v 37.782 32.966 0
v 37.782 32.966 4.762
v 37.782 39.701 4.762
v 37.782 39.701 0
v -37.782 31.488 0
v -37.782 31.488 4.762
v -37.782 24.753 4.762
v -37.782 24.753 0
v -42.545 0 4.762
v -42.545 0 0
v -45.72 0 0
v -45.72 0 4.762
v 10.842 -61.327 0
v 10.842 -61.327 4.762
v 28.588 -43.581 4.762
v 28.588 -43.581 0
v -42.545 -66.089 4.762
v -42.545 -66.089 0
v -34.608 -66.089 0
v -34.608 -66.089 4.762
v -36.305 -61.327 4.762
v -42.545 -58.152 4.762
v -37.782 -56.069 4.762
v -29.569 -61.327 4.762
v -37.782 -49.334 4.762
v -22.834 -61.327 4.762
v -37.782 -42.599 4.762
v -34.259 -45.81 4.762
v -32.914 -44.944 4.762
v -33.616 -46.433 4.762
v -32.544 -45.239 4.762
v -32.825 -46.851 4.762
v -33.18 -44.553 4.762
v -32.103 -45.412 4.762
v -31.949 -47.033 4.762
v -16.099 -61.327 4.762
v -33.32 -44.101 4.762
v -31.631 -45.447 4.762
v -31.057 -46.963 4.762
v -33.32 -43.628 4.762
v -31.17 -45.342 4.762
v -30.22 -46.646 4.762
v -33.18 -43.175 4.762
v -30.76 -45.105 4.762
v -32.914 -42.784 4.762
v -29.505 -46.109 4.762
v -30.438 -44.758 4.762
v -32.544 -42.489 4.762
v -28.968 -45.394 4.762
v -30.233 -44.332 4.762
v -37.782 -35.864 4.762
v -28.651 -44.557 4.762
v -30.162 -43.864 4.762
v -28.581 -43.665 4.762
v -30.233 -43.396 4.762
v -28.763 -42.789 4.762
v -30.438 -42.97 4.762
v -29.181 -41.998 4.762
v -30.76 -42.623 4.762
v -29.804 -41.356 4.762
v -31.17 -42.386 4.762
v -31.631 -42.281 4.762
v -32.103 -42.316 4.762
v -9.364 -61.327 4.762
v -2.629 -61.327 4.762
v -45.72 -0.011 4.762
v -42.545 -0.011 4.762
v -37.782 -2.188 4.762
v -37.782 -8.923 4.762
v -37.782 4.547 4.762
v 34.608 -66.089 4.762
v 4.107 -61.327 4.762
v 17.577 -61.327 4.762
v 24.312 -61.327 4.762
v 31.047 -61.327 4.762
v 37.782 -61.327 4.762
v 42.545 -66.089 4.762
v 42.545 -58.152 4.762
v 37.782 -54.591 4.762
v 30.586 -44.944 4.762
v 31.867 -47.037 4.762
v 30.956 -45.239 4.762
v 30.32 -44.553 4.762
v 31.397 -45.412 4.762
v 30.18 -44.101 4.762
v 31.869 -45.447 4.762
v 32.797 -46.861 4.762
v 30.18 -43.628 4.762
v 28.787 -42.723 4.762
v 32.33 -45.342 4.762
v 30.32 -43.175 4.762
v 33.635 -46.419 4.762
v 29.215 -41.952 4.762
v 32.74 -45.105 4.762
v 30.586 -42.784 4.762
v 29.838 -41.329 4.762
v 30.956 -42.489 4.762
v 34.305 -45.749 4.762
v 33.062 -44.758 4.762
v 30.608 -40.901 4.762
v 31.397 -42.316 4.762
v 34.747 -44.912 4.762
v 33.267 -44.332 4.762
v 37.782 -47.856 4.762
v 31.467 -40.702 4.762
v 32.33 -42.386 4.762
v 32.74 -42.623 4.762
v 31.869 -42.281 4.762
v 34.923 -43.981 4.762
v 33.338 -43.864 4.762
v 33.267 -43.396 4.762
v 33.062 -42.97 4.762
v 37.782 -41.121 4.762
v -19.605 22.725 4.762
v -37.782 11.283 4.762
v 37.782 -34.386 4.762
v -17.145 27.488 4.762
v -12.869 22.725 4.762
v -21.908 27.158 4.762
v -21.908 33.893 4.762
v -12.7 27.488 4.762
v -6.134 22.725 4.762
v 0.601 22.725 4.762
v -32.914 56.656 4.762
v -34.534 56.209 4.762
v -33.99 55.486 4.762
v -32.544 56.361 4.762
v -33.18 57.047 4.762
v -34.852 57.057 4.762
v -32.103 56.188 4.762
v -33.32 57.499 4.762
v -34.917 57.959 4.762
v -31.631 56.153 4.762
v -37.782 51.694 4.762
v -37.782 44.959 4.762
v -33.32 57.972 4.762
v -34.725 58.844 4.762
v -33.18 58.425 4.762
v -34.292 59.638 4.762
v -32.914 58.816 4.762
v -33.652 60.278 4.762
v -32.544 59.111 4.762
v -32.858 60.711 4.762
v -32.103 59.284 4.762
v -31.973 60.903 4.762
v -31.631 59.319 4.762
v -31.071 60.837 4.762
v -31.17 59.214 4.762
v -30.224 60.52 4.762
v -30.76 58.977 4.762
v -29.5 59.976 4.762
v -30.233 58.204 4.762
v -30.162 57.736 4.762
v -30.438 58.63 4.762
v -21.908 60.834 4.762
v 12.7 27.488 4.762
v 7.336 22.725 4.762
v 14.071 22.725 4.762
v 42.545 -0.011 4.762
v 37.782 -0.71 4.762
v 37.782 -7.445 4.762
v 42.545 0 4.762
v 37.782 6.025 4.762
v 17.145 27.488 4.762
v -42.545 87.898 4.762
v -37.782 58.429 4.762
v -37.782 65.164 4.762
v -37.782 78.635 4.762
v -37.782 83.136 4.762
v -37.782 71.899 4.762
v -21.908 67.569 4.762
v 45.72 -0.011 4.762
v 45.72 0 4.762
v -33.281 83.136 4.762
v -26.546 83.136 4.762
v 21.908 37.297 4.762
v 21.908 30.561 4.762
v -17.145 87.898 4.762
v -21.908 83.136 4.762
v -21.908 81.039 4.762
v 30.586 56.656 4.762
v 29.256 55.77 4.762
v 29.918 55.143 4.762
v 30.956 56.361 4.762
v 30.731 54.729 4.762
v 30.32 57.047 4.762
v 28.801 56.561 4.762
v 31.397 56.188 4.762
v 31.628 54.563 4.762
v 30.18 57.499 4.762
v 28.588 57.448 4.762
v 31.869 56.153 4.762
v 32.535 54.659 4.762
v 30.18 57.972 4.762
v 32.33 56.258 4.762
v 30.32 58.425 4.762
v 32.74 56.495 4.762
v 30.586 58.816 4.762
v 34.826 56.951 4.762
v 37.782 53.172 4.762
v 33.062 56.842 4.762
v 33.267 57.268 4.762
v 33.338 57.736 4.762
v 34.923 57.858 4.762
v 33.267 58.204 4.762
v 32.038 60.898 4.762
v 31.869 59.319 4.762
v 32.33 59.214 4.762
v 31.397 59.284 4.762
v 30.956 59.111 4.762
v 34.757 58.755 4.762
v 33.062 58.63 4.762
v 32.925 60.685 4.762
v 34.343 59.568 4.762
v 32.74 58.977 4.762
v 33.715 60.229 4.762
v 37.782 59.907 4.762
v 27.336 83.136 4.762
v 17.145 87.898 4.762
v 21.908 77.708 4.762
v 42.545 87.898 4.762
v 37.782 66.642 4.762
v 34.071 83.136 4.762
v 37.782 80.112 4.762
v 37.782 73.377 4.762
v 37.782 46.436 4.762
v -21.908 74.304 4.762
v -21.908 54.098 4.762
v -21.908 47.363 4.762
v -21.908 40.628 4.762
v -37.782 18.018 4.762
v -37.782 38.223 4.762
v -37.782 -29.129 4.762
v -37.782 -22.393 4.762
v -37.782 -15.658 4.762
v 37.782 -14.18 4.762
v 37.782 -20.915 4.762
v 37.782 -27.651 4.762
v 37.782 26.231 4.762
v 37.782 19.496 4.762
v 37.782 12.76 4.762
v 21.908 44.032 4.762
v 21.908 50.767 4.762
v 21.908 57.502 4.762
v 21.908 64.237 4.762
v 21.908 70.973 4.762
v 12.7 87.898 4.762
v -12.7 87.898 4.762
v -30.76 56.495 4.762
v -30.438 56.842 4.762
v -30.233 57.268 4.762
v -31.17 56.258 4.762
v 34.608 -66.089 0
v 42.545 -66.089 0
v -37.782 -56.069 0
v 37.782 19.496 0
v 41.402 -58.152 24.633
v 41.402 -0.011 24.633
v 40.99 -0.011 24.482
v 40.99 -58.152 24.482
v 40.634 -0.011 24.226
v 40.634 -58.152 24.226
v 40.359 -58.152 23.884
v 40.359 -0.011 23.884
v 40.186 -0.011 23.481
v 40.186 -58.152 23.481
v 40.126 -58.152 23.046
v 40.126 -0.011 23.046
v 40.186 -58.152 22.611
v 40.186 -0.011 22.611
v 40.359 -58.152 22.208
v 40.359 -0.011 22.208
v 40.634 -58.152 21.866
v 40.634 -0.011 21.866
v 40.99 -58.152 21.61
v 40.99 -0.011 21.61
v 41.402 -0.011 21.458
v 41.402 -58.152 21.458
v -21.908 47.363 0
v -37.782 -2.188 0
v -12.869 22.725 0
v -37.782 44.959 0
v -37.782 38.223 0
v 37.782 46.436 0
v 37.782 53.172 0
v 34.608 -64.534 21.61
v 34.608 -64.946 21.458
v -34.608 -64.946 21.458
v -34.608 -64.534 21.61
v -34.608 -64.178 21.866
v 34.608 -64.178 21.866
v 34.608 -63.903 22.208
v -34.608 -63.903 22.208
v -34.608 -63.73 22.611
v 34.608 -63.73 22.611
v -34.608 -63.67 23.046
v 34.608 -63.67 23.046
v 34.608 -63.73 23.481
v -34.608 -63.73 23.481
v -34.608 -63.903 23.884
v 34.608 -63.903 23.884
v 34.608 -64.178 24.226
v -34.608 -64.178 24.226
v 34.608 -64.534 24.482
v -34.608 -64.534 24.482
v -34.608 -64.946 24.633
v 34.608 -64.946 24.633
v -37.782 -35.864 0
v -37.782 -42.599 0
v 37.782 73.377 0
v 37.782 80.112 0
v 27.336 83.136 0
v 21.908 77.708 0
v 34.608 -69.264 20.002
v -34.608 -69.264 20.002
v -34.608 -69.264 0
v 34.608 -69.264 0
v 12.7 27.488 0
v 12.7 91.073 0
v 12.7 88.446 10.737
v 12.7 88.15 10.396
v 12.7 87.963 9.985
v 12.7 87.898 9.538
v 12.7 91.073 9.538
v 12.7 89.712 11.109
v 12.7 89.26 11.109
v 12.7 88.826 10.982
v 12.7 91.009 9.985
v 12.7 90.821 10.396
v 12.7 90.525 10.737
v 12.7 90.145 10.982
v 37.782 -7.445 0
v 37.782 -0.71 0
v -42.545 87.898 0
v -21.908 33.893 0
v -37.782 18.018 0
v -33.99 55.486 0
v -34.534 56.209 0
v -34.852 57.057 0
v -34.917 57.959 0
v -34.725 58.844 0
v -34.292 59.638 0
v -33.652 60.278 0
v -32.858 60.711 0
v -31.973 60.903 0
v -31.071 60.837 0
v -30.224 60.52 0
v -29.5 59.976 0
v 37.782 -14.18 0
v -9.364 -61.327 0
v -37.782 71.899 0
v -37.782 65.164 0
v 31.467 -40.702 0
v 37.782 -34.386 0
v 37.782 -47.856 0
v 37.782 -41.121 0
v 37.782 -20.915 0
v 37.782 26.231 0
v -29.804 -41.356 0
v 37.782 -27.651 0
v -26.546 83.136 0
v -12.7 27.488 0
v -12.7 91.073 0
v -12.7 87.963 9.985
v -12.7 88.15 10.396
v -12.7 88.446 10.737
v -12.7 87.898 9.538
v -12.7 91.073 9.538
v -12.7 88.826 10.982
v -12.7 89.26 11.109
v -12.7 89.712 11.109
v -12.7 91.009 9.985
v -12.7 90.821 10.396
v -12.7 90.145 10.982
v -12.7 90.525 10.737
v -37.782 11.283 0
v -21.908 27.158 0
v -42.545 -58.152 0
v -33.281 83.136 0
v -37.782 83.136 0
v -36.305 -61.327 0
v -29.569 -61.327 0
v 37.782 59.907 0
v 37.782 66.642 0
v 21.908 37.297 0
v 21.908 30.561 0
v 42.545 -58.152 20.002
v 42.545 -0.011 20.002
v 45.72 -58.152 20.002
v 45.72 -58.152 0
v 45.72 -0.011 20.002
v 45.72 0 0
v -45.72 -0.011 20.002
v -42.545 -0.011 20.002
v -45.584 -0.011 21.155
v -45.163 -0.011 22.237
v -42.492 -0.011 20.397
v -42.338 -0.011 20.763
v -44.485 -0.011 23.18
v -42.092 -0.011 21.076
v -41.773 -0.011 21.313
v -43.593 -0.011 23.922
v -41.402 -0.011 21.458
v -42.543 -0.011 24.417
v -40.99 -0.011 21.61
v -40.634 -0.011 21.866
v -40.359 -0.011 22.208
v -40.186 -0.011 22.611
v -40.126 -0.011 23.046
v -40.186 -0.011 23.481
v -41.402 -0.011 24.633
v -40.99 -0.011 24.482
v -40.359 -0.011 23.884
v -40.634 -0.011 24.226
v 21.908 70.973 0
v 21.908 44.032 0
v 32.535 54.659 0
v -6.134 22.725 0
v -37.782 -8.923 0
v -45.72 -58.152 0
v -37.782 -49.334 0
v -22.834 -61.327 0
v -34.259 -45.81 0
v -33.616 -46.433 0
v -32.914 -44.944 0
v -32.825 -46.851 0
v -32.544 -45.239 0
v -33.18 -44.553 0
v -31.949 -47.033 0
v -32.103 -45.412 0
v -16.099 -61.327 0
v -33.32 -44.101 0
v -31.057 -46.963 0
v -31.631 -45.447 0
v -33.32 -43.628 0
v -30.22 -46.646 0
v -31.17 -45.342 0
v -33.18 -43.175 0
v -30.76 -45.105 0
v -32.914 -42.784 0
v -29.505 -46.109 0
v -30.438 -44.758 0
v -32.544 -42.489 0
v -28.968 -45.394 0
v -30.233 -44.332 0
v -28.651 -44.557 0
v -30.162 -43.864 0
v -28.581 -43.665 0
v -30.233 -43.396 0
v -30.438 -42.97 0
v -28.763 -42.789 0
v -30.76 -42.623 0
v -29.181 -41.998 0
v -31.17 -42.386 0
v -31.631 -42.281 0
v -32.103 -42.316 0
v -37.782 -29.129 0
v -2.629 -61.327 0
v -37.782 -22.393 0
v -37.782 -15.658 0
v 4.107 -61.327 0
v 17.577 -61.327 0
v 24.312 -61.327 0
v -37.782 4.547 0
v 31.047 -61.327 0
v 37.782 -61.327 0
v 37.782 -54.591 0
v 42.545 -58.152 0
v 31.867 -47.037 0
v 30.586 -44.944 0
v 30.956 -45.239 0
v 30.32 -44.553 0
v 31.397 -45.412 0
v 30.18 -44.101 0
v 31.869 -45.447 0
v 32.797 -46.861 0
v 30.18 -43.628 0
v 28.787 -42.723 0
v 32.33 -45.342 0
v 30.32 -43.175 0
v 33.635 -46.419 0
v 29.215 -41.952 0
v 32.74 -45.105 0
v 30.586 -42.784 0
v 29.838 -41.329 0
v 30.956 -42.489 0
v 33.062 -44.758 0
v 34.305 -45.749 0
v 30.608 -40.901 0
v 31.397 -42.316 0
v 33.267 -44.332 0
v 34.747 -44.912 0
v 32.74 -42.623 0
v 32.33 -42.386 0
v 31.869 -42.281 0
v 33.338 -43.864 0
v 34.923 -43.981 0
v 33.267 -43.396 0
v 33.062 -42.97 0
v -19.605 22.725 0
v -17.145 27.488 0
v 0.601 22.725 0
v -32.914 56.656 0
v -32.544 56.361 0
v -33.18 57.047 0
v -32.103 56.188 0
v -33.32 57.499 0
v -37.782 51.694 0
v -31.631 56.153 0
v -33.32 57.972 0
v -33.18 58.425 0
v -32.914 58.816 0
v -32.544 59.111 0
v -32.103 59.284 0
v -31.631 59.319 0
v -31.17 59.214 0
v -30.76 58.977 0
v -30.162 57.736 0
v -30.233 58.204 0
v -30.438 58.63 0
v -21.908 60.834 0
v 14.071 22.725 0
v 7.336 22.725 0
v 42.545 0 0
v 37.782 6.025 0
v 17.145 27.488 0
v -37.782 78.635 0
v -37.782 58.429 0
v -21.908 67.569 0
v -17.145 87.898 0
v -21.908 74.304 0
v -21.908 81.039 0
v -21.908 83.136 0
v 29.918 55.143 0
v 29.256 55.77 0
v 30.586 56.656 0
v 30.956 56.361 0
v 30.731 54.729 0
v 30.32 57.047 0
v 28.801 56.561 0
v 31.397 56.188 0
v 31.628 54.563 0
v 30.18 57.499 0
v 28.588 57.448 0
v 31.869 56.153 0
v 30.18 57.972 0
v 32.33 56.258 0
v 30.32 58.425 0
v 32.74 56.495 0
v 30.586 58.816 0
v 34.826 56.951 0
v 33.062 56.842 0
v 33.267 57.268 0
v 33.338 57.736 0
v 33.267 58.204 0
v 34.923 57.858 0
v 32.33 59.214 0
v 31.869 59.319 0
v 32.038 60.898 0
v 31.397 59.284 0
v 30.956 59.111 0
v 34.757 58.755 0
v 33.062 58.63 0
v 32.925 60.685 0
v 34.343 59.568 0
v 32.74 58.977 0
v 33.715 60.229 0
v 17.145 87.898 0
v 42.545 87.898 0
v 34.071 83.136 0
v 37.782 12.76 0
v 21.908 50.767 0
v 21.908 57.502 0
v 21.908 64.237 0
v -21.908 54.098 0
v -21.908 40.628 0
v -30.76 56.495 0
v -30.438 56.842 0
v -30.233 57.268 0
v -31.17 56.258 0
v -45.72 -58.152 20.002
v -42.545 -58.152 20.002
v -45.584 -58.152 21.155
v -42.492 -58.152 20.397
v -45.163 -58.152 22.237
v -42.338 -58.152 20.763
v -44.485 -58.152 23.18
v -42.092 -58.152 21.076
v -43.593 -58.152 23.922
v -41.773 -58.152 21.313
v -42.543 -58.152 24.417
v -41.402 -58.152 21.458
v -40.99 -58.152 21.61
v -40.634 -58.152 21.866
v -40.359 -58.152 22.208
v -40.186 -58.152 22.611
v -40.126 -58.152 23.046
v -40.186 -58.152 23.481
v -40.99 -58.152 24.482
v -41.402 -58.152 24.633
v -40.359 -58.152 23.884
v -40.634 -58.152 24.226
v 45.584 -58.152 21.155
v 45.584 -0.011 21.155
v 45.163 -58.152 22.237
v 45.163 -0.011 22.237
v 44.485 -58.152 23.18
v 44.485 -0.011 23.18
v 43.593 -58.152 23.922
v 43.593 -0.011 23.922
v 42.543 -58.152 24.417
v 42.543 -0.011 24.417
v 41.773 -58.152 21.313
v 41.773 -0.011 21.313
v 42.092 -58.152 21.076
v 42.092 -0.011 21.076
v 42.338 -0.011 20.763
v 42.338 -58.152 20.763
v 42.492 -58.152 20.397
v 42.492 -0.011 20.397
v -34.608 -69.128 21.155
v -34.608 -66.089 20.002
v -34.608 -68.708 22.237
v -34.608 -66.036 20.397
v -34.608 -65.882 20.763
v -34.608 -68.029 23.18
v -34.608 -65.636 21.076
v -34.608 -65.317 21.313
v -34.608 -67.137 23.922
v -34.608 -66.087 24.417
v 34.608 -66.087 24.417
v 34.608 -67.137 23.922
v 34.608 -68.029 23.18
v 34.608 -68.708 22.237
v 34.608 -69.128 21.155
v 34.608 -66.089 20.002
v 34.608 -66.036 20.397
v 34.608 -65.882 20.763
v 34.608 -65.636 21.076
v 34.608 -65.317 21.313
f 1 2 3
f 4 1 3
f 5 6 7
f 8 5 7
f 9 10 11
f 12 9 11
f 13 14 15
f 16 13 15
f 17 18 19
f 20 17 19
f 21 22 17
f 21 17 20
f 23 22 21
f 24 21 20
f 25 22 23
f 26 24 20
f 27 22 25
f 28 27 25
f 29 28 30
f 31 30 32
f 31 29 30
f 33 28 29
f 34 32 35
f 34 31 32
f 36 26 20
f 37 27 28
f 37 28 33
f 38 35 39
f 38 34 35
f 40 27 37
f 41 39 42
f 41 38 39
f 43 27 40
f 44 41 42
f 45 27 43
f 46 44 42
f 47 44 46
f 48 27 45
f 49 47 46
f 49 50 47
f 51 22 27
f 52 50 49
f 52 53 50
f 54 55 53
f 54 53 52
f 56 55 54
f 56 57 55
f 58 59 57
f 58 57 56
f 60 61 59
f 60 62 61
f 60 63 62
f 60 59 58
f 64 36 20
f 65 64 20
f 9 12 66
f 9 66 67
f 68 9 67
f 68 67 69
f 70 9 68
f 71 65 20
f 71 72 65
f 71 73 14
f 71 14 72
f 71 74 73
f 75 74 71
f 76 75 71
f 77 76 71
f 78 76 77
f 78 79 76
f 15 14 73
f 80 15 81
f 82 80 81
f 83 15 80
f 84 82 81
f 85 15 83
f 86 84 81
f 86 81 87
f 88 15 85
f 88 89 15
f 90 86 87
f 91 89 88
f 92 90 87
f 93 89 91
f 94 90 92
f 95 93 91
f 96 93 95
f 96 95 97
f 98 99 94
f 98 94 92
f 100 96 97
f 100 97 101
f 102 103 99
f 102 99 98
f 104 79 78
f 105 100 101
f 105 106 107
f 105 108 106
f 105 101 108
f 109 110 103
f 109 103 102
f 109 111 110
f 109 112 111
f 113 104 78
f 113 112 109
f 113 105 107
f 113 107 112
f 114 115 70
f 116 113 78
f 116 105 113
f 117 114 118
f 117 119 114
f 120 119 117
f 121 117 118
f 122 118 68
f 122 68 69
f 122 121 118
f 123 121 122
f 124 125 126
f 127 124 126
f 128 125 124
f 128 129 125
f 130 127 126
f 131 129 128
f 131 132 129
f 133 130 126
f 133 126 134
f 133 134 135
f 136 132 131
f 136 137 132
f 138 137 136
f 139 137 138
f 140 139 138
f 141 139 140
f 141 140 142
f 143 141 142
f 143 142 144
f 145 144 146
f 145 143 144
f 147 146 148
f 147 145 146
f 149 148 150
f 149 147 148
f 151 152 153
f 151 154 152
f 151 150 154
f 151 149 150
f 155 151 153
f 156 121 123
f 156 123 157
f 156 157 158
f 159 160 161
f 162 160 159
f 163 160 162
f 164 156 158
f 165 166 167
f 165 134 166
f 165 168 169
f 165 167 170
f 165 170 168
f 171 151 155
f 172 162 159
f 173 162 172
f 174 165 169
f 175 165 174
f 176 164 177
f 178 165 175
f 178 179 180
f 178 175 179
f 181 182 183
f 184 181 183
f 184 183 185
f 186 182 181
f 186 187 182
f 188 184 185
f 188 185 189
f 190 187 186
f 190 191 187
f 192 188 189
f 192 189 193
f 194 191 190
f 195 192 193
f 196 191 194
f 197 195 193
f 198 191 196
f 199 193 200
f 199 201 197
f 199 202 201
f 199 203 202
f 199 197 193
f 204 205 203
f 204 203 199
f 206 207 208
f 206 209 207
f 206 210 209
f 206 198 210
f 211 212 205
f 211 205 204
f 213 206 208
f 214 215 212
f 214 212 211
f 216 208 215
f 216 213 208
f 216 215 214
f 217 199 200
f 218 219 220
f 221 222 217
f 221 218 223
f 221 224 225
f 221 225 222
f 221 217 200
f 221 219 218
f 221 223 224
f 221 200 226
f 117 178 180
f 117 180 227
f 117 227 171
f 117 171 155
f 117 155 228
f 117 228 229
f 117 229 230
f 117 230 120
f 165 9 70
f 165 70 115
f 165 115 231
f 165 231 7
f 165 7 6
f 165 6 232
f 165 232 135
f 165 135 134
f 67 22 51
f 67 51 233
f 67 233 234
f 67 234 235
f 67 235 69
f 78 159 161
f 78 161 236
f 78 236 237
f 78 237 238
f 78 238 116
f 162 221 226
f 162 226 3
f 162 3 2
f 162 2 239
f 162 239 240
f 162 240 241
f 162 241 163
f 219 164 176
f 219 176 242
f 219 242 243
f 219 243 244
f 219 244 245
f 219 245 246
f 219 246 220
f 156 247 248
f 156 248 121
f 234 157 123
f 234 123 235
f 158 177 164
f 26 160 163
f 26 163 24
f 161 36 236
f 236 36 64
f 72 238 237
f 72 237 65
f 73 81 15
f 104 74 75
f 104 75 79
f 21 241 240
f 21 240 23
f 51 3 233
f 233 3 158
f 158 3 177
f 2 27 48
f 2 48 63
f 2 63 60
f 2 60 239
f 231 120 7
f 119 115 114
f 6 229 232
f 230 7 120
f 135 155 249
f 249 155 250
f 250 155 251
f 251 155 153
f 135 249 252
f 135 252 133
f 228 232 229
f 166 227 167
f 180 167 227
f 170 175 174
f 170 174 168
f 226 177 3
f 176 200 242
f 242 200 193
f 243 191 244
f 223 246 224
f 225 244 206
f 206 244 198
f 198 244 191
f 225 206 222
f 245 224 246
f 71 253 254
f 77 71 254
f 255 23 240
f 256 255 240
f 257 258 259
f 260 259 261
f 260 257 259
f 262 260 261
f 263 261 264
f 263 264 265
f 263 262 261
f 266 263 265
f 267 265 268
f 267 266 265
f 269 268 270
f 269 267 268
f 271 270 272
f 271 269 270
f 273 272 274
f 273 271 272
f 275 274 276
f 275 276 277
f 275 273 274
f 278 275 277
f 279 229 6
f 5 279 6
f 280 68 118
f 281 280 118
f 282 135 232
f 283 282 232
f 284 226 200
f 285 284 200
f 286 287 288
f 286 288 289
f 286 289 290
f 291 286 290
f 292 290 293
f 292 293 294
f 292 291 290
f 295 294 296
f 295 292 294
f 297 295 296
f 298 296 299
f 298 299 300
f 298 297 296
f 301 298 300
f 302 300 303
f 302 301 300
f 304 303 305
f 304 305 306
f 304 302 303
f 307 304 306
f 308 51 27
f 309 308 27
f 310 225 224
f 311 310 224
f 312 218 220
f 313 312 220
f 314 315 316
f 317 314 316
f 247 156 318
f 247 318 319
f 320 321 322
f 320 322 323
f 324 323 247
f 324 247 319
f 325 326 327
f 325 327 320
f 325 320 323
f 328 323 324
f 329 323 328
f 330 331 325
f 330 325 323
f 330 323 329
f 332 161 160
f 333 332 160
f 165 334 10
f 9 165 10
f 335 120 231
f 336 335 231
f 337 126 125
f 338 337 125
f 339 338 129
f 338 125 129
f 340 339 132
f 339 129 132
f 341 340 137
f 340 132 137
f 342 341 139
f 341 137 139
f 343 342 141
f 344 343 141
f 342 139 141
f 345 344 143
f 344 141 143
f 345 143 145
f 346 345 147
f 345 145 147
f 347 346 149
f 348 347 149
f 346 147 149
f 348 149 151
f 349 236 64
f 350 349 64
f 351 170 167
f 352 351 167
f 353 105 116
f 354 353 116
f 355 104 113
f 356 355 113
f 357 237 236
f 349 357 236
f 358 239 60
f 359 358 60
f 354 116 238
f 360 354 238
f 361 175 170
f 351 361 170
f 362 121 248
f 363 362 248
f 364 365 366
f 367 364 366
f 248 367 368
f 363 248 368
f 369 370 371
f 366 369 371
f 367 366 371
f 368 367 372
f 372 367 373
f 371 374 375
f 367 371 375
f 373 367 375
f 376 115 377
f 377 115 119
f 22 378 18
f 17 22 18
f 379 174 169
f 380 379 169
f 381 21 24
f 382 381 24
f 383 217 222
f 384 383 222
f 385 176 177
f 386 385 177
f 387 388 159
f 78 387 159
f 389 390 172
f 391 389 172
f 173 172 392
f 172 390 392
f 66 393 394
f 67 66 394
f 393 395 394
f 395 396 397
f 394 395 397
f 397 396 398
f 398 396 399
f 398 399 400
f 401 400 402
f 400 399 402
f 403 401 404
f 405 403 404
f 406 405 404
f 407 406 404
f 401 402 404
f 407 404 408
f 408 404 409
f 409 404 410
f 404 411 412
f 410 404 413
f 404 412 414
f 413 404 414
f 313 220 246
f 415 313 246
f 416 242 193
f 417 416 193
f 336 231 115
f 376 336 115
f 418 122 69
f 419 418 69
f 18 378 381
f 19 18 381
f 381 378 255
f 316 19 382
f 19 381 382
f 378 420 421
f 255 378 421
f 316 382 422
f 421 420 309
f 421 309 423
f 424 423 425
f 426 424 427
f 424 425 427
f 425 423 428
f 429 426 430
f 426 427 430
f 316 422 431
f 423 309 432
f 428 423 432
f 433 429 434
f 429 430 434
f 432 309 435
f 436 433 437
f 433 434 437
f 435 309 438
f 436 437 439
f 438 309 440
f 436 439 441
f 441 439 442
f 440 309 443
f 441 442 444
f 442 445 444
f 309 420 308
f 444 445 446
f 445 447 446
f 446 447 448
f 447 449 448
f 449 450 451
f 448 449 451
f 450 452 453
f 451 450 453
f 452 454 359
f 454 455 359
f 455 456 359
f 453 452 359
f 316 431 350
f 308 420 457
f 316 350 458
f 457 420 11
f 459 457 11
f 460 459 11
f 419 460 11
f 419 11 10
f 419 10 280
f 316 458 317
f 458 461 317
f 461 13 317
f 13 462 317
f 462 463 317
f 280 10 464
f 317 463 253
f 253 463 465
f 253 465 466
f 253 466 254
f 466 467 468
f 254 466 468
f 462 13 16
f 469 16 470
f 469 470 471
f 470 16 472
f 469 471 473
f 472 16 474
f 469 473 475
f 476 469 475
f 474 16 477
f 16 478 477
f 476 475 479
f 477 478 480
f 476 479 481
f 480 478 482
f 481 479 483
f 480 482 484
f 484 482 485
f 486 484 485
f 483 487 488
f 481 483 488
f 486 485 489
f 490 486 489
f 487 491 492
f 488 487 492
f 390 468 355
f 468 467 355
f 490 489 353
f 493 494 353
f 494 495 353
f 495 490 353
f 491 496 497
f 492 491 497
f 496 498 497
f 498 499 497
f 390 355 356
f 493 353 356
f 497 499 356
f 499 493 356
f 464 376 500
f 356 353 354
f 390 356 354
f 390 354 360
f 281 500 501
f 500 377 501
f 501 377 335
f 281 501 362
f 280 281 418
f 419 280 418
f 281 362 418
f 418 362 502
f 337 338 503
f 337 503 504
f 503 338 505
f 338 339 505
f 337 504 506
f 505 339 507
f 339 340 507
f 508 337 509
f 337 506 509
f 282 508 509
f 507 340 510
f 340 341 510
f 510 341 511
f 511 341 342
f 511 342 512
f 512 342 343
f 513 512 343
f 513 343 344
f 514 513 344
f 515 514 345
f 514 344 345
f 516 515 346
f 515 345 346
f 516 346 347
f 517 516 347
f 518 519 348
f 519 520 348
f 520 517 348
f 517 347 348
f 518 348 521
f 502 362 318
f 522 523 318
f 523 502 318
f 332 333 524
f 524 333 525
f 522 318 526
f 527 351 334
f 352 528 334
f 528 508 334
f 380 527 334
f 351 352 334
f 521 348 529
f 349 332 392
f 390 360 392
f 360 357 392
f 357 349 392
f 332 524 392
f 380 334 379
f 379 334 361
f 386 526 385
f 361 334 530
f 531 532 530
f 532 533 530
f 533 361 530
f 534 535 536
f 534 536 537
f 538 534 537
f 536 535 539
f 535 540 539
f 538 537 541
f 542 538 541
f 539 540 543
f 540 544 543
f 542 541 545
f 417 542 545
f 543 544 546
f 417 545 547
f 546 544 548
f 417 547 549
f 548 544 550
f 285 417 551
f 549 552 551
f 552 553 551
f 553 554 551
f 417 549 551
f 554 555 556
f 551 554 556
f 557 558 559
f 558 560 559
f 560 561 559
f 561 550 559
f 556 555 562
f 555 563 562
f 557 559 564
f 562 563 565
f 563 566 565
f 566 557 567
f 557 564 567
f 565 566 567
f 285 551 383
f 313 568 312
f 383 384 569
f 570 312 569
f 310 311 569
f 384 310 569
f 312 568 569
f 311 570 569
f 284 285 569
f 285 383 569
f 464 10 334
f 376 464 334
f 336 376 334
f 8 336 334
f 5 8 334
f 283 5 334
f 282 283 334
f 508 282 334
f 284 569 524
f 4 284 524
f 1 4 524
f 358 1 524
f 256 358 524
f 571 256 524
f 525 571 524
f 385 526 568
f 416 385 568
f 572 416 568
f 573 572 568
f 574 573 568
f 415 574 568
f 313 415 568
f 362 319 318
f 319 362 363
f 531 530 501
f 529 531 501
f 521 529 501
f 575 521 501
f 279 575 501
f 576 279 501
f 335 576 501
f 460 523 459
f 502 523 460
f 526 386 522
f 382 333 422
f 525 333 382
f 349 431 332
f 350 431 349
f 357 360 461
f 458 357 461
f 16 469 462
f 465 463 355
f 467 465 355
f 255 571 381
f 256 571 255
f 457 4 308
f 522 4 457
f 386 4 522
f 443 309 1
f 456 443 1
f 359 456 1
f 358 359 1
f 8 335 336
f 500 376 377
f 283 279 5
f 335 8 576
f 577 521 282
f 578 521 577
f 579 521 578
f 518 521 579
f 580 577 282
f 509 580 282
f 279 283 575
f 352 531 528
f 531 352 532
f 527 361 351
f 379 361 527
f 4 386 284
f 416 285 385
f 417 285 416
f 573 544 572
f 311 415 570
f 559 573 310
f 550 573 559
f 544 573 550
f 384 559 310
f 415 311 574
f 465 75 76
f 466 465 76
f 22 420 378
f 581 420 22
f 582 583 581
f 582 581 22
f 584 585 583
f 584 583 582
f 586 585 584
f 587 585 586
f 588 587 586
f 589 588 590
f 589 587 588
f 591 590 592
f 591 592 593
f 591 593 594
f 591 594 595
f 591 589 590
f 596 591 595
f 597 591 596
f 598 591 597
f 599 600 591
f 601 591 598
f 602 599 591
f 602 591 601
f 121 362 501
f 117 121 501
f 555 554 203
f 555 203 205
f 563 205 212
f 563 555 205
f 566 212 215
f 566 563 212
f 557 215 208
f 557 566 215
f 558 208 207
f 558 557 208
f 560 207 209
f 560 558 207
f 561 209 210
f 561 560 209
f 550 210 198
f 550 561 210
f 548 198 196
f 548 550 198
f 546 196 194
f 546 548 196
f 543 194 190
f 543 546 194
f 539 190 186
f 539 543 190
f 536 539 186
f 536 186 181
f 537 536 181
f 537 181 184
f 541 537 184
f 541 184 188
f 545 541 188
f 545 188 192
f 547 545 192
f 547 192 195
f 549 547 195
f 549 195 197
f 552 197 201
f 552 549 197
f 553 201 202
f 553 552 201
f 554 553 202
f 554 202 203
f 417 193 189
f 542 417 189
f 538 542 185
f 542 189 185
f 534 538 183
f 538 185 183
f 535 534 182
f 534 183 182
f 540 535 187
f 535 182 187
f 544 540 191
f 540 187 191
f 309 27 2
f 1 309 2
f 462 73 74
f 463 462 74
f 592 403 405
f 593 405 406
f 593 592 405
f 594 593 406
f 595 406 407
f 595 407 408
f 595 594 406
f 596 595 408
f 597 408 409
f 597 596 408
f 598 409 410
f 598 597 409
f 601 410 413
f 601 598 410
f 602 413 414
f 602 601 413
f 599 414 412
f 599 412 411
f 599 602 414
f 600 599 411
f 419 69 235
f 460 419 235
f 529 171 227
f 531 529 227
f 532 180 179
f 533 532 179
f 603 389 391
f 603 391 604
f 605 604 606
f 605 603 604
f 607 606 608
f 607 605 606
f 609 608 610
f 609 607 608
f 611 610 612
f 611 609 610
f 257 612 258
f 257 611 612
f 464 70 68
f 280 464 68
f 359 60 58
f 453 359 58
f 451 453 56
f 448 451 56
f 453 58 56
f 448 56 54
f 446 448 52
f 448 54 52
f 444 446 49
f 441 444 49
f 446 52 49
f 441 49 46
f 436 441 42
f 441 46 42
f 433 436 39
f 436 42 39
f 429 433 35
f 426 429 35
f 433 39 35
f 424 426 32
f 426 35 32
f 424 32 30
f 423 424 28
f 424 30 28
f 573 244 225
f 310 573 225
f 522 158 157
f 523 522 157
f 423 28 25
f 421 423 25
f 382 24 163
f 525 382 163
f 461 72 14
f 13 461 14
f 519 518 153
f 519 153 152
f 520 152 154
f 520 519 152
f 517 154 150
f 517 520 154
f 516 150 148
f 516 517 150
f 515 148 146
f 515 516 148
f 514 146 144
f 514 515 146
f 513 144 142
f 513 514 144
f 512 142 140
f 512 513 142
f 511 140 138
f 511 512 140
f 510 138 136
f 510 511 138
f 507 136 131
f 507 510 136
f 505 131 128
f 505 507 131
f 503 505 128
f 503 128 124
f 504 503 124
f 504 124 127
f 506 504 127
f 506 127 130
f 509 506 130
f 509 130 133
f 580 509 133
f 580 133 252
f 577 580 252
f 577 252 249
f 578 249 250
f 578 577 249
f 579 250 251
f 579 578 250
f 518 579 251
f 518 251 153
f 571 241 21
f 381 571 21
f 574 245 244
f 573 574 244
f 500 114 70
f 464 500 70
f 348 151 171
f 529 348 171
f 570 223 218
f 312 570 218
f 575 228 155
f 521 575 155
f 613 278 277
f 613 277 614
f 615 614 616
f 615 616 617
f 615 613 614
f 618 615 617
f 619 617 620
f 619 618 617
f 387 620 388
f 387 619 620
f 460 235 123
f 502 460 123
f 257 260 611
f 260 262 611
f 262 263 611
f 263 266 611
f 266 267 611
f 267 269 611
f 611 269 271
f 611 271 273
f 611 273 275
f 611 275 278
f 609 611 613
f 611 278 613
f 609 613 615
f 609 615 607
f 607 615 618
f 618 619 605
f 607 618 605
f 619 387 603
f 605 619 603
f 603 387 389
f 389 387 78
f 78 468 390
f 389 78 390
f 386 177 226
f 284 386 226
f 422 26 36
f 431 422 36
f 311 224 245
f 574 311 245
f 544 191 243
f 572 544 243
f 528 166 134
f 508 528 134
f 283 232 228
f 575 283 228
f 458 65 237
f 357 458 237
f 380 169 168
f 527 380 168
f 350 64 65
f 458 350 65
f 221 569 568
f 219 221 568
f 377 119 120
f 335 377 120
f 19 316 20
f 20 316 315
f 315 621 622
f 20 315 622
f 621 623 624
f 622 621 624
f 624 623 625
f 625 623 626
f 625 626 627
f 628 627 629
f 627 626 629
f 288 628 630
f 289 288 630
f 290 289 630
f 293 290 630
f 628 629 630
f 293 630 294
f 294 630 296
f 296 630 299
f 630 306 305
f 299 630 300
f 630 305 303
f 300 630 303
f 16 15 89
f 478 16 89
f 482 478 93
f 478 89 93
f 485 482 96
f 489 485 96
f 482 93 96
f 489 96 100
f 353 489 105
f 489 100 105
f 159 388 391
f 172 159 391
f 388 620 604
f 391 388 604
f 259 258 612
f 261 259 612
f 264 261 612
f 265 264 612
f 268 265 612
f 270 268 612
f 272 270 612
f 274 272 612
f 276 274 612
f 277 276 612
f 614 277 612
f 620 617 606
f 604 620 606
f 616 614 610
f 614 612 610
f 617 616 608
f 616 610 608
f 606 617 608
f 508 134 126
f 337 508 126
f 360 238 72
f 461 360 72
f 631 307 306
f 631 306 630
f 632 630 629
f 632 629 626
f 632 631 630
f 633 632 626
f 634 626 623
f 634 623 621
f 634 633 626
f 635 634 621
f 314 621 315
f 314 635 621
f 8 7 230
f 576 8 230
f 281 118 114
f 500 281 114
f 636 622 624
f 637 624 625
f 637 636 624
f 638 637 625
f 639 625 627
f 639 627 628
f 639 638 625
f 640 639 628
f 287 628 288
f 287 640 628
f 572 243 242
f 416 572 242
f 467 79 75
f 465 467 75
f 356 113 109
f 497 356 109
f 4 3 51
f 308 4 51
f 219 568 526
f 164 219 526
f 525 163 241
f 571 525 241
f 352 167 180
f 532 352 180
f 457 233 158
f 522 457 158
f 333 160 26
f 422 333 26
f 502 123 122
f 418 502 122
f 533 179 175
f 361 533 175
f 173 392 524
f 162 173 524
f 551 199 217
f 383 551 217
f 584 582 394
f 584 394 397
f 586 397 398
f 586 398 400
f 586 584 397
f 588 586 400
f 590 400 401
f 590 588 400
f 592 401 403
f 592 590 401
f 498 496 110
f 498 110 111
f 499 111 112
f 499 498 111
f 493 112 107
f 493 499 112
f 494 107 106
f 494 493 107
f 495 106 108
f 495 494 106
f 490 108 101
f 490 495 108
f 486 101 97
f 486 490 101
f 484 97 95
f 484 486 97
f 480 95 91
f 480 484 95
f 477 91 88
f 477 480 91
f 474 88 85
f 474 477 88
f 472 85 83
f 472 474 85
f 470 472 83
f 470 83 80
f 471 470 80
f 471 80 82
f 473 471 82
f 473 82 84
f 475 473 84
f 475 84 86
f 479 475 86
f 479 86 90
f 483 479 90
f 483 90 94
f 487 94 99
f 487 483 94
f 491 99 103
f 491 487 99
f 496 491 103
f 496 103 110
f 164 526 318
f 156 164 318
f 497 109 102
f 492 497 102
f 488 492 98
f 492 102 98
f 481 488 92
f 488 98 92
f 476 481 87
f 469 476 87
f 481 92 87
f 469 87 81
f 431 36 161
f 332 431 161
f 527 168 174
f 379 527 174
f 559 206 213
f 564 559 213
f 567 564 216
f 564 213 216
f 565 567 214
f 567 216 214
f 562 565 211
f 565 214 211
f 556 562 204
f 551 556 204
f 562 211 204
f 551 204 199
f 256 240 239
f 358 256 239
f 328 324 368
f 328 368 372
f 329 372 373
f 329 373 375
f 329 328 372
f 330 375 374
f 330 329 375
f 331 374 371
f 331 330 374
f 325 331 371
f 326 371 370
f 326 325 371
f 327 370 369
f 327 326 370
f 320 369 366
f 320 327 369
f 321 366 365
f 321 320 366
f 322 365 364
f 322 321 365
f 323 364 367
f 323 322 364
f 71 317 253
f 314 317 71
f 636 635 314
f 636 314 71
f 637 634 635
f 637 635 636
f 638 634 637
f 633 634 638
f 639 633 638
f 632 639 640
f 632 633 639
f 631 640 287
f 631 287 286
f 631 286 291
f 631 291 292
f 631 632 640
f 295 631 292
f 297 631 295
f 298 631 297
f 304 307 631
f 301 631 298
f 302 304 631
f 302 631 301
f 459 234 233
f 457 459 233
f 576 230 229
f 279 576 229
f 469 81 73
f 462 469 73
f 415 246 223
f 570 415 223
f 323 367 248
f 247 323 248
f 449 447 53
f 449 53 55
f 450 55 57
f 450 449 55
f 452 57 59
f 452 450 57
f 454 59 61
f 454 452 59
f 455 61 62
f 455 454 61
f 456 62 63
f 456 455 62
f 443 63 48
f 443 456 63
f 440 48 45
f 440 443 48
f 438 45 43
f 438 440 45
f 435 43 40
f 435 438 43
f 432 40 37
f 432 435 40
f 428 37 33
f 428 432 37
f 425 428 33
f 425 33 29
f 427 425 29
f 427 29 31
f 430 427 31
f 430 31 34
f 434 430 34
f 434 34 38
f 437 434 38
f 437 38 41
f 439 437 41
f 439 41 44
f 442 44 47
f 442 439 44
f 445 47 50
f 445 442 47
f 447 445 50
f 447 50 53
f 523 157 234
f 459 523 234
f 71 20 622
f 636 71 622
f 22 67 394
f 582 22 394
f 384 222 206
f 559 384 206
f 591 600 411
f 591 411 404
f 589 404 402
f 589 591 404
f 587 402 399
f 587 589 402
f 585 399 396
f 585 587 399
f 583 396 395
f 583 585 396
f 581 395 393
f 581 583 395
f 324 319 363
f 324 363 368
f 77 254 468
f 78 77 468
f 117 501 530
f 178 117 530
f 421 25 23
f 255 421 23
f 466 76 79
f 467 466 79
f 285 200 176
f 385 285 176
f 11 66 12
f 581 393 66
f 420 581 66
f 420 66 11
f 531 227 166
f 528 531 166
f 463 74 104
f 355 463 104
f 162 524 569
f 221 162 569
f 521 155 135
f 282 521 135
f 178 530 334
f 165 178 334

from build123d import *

# Parameters (mm, degrees)
F0_R     = 1.5875
F1_DEPTH = 4.7625
F3_DEPTH = 58.1406
F5_DEPTH = 69.215
F7_DEPTH = 25.4
F9_DEPTH = 4.7625


with BuildPart() as f1:
    # F0 (on Top) → F1 (new body)
    with BuildSketch(Plane.XY):
        Polygon((-17.145, 87.89836), (-42.545, 87.89836), (-42.545, 0), (-45.72, 0), (-45.72, -58.15164), (-42.545, -58.15164), (-42.545, -66.08914), (-34.6075, -66.08914), (-34.6075, -69.26414), (34.6075, -69.26414), (34.6075, -66.08914), (42.545, -66.08914), (42.545, -58.15164), (45.72, -58.15164), (45.72, 0), (42.545, 0), (42.545, 87.89836), (17.145, 87.89836), (17.145, 27.487862), (12.7, 27.487862), (12.7, 91.07336), (-12.7, 91.07336), (-12.7, 27.487862), (-17.145, 27.487862), align=None)
        with Locations((-31.75, -43.86414)):
            Circle(F0_R, mode=Mode.SUBTRACT)
        with Locations((31.75, -43.86414)):
            Circle(F0_R, mode=Mode.SUBTRACT)
        with Locations((-31.75, 57.73586)):
            Circle(F0_R, mode=Mode.SUBTRACT)
        with Locations((31.75, 57.73586)):
            Circle(F0_R, mode=Mode.SUBTRACT)
    extrude(amount=F1_DEPTH)

    # F2 (on face) → F3 (join)
    with BuildSketch(Plane.XZ.offset(58.15164)):
        with BuildLine():
            Line((-45.72, 20.0025), (-45.72, 4.7625))
            Line((-45.72, 4.7625), (-42.545, 4.7625))
            Line((-42.545, 4.7625), (-42.545, 20.0025))
            ThreePointArc((-42.545, 20.0025), (-42.225108, 20.927946), (-41.402, 21.458299))
            ThreePointArc((-41.402, 21.458299), (-40.126284, 23.045799), (-41.402, 24.633299))
            ThreePointArc((-41.402, 24.633299), (-44.485221, 23.179692), (-45.72, 20.0025))
        make_face()
        with BuildLine():
            Line((42.545, 20.0025), (42.545, 4.7625))
            Line((42.545, 4.7625), (45.72, 4.7625))
            Line((45.72, 4.7625), (45.72, 20.0025))
            ThreePointArc((45.72, 20.0025), (44.485221, 23.179692), (41.402, 24.633299))
            ThreePointArc((41.402, 24.633299), (40.126284, 23.045799), (41.402, 21.458299))
            ThreePointArc((41.402, 21.458299), (42.225108, 20.927946), (42.545, 20.0025))
        make_face()
    extrude(amount=-F3_DEPTH)

    # F4 (on face) → F5 (join)
    with BuildSketch(Plane.YZ.offset(34.6075)):
        with BuildLine():
            Line((-69.26414, 20.0025), (-69.26414, 4.7625))
            Line((-69.26414, 4.7625), (-66.08914, 4.7625))
            Line((-66.08914, 4.7625), (-66.08914, 20.0025))
            ThreePointArc((-66.08914, 20.0025), (-65.769247, 20.927946), (-64.94614, 21.458299))
            ThreePointArc((-64.94614, 21.458299), (-63.670424, 23.045799), (-64.94614, 24.633299))
            ThreePointArc((-64.94614, 24.633299), (-68.029361, 23.179692), (-69.26414, 20.0025))
        make_face()
    extrude(amount=-F5_DEPTH)

    # F6 (on face) → F7 (join)
    with BuildSketch(Plane.YZ.offset(12.7)):
        with BuildLine():
            Line((87.89836, 4.7625), (91.07336, 4.7625))
            Line((91.07336, 4.7625), (91.07336, 9.5377))
            ThreePointArc((91.07336, 9.5377), (89.48586, 11.1252), (87.89836, 9.5377))
            Line((87.89836, 9.5377), (87.89836, 4.7625))
        make_face()
    extrude(amount=-F7_DEPTH)

    # F8 (on face) → F9 (cut)
    with BuildSketch(Plane.XY.offset(4.7625)):
        Polygon((-33.281147, 83.13586), (-37.7825, 83.13586), (-37.7825, 78.634507), align=None)
        Polygon((-21.9075, 81.039123), (-21.9075, 83.13586), (-26.545955, 83.13586), (-37.7825, 71.899315), (-37.7825, 65.164123), align=None)
        Polygon((-12.869341, 22.725362), (-19.604533, 22.725362), (-37.7825, 4.547394), (-37.7825, -2.187798), align=None)
        Polygon((34.070774, 83.13586), (27.335582, 83.13586), (21.9075, 77.707778), (21.9075, 70.972586), align=None)
        Polygon((37.7825, 73.377202), (37.7825, 80.112394), (21.9075, 64.237394), (21.9075, 57.502202), align=None)
        Polygon((31.047308, -61.32664), (37.7825, -61.32664), (37.7825, -54.591448), align=None)
        with BuildLine():
            Line((-37.7825, -49.334142), (-37.7825, -56.069335))
            Line((-37.7825, -56.069335), (37.7825, 19.495665))
            Line((37.7825, 19.495665), (37.7825, 26.230858))
            Line((37.7825, 26.230858), (-29.803871, -41.355513))
            ThreePointArc((-29.803871, -41.355513), (-29.504936, -46.109204), (-34.258626, -45.810269))
            Line((-34.258626, -45.810269), (-37.7825, -49.334142))
        make_face()
        with BuildLine():
            ThreePointArc((32.535156, 54.659474), (29.918155, 55.142606), (28.588111, 57.447621))
            Line((28.588111, 57.447621), (21.9075, 50.76701))
            Line((21.9075, 50.76701), (21.9075, 44.031818))
            Line((21.9075, 44.031818), (32.535156, 54.659474))
        make_face()
        with BuildLine():
            ThreePointArc((-33.990248, 55.485991), (-33.995064, 59.980924), (-29.50013, 59.976109))
            Line((-29.50013, 59.976109), (-21.9075, 67.568739))
            Line((-21.9075, 67.568739), (-21.9075, 74.303931))
            Line((-21.9075, 74.303931), (-37.7825, 58.428931))
            Line((-37.7825, 58.428931), (-37.7825, 51.693739))
            Line((-37.7825, 51.693739), (-33.990248, 55.485991))
        make_face()
        with BuildLine():
            Line((17.576924, -61.32664), (24.312116, -61.32664))
            Line((24.312116, -61.32664), (37.7825, -47.856255))
            Line((37.7825, -47.856255), (37.7825, -41.121063))
            Line((37.7825, -41.121063), (34.92286, -43.980704))
            ThreePointArc((34.92286, -43.980704), (33.995064, -46.109204), (31.866564, -47.036999))
            Line((31.866564, -47.036999), (17.576924, -61.32664))
        make_face()
        with BuildLine():
            Line((4.10654, -61.32664), (10.841732, -61.32664))
            Line((10.841732, -61.32664), (28.587678, -43.580694))
            ThreePointArc((28.587678, -43.580694), (29.504936, -41.619076), (31.466554, -40.701817))
            Line((31.466554, -40.701817), (37.7825, -34.385871))
            Line((37.7825, -34.385871), (37.7825, -27.650679))
            Line((37.7825, -27.650679), (4.10654, -61.32664))
        make_face()
        Polygon((-9.363845, -61.32664), (-2.628653, -61.32664), (37.7825, -20.915487), (37.7825, -14.180295), align=None)
        Polygon((-22.834229, -61.32664), (-16.099037, -61.32664), (37.7825, -7.445103), (37.7825, -0.709911), align=None)
        Polygon((-36.304613, -61.32664), (-29.569421, -61.32664), (37.7825, 6.025281), (37.7825, 12.760473), align=None)
        Polygon((-37.7825, -35.863758), (-37.7825, -42.59895), (37.7825, 32.96605), (37.7825, 39.701242), (20.80662, 22.725362), align=None)
        Polygon((-37.7825, -22.393374), (-37.7825, -29.128566), (14.071428, 22.725362), (7.336236, 22.725362), align=None)
        Polygon((-37.7825, -8.92299), (-37.7825, -15.658182), (0.601044, 22.725362), (-6.134148, 22.725362), align=None)
        Polygon((-37.7825, 18.017778), (-37.7825, 11.282586), (-21.9075, 27.157586), (-21.9075, 33.892778), align=None)
        Polygon((-37.7825, 31.488163), (-37.7825, 24.752971), (-21.9075, 40.627971), (-21.9075, 47.363163), align=None)
        Polygon((-37.7825, 44.958547), (-37.7825, 38.223355), (-21.9075, 54.098355), (-21.9075, 60.833547), align=None)
        Polygon((37.7825, 46.436434), (37.7825, 53.171626), (21.9075, 37.296626), (21.9075, 30.561434), align=None)
        with BuildLine():
            Line((37.7825, 59.906818), (37.7825, 66.64201))
            Line((37.7825, 66.64201), (32.038239, 60.89775))
            ThreePointArc((32.038239, 60.89775), (34.343254, 59.567706), (34.826387, 56.950705))
            Line((34.826387, 56.950705), (37.7825, 59.906818))
        make_face()
    extrude(amount=-F9_DEPTH, mode=Mode.SUBTRACT)


solid = f1.part
